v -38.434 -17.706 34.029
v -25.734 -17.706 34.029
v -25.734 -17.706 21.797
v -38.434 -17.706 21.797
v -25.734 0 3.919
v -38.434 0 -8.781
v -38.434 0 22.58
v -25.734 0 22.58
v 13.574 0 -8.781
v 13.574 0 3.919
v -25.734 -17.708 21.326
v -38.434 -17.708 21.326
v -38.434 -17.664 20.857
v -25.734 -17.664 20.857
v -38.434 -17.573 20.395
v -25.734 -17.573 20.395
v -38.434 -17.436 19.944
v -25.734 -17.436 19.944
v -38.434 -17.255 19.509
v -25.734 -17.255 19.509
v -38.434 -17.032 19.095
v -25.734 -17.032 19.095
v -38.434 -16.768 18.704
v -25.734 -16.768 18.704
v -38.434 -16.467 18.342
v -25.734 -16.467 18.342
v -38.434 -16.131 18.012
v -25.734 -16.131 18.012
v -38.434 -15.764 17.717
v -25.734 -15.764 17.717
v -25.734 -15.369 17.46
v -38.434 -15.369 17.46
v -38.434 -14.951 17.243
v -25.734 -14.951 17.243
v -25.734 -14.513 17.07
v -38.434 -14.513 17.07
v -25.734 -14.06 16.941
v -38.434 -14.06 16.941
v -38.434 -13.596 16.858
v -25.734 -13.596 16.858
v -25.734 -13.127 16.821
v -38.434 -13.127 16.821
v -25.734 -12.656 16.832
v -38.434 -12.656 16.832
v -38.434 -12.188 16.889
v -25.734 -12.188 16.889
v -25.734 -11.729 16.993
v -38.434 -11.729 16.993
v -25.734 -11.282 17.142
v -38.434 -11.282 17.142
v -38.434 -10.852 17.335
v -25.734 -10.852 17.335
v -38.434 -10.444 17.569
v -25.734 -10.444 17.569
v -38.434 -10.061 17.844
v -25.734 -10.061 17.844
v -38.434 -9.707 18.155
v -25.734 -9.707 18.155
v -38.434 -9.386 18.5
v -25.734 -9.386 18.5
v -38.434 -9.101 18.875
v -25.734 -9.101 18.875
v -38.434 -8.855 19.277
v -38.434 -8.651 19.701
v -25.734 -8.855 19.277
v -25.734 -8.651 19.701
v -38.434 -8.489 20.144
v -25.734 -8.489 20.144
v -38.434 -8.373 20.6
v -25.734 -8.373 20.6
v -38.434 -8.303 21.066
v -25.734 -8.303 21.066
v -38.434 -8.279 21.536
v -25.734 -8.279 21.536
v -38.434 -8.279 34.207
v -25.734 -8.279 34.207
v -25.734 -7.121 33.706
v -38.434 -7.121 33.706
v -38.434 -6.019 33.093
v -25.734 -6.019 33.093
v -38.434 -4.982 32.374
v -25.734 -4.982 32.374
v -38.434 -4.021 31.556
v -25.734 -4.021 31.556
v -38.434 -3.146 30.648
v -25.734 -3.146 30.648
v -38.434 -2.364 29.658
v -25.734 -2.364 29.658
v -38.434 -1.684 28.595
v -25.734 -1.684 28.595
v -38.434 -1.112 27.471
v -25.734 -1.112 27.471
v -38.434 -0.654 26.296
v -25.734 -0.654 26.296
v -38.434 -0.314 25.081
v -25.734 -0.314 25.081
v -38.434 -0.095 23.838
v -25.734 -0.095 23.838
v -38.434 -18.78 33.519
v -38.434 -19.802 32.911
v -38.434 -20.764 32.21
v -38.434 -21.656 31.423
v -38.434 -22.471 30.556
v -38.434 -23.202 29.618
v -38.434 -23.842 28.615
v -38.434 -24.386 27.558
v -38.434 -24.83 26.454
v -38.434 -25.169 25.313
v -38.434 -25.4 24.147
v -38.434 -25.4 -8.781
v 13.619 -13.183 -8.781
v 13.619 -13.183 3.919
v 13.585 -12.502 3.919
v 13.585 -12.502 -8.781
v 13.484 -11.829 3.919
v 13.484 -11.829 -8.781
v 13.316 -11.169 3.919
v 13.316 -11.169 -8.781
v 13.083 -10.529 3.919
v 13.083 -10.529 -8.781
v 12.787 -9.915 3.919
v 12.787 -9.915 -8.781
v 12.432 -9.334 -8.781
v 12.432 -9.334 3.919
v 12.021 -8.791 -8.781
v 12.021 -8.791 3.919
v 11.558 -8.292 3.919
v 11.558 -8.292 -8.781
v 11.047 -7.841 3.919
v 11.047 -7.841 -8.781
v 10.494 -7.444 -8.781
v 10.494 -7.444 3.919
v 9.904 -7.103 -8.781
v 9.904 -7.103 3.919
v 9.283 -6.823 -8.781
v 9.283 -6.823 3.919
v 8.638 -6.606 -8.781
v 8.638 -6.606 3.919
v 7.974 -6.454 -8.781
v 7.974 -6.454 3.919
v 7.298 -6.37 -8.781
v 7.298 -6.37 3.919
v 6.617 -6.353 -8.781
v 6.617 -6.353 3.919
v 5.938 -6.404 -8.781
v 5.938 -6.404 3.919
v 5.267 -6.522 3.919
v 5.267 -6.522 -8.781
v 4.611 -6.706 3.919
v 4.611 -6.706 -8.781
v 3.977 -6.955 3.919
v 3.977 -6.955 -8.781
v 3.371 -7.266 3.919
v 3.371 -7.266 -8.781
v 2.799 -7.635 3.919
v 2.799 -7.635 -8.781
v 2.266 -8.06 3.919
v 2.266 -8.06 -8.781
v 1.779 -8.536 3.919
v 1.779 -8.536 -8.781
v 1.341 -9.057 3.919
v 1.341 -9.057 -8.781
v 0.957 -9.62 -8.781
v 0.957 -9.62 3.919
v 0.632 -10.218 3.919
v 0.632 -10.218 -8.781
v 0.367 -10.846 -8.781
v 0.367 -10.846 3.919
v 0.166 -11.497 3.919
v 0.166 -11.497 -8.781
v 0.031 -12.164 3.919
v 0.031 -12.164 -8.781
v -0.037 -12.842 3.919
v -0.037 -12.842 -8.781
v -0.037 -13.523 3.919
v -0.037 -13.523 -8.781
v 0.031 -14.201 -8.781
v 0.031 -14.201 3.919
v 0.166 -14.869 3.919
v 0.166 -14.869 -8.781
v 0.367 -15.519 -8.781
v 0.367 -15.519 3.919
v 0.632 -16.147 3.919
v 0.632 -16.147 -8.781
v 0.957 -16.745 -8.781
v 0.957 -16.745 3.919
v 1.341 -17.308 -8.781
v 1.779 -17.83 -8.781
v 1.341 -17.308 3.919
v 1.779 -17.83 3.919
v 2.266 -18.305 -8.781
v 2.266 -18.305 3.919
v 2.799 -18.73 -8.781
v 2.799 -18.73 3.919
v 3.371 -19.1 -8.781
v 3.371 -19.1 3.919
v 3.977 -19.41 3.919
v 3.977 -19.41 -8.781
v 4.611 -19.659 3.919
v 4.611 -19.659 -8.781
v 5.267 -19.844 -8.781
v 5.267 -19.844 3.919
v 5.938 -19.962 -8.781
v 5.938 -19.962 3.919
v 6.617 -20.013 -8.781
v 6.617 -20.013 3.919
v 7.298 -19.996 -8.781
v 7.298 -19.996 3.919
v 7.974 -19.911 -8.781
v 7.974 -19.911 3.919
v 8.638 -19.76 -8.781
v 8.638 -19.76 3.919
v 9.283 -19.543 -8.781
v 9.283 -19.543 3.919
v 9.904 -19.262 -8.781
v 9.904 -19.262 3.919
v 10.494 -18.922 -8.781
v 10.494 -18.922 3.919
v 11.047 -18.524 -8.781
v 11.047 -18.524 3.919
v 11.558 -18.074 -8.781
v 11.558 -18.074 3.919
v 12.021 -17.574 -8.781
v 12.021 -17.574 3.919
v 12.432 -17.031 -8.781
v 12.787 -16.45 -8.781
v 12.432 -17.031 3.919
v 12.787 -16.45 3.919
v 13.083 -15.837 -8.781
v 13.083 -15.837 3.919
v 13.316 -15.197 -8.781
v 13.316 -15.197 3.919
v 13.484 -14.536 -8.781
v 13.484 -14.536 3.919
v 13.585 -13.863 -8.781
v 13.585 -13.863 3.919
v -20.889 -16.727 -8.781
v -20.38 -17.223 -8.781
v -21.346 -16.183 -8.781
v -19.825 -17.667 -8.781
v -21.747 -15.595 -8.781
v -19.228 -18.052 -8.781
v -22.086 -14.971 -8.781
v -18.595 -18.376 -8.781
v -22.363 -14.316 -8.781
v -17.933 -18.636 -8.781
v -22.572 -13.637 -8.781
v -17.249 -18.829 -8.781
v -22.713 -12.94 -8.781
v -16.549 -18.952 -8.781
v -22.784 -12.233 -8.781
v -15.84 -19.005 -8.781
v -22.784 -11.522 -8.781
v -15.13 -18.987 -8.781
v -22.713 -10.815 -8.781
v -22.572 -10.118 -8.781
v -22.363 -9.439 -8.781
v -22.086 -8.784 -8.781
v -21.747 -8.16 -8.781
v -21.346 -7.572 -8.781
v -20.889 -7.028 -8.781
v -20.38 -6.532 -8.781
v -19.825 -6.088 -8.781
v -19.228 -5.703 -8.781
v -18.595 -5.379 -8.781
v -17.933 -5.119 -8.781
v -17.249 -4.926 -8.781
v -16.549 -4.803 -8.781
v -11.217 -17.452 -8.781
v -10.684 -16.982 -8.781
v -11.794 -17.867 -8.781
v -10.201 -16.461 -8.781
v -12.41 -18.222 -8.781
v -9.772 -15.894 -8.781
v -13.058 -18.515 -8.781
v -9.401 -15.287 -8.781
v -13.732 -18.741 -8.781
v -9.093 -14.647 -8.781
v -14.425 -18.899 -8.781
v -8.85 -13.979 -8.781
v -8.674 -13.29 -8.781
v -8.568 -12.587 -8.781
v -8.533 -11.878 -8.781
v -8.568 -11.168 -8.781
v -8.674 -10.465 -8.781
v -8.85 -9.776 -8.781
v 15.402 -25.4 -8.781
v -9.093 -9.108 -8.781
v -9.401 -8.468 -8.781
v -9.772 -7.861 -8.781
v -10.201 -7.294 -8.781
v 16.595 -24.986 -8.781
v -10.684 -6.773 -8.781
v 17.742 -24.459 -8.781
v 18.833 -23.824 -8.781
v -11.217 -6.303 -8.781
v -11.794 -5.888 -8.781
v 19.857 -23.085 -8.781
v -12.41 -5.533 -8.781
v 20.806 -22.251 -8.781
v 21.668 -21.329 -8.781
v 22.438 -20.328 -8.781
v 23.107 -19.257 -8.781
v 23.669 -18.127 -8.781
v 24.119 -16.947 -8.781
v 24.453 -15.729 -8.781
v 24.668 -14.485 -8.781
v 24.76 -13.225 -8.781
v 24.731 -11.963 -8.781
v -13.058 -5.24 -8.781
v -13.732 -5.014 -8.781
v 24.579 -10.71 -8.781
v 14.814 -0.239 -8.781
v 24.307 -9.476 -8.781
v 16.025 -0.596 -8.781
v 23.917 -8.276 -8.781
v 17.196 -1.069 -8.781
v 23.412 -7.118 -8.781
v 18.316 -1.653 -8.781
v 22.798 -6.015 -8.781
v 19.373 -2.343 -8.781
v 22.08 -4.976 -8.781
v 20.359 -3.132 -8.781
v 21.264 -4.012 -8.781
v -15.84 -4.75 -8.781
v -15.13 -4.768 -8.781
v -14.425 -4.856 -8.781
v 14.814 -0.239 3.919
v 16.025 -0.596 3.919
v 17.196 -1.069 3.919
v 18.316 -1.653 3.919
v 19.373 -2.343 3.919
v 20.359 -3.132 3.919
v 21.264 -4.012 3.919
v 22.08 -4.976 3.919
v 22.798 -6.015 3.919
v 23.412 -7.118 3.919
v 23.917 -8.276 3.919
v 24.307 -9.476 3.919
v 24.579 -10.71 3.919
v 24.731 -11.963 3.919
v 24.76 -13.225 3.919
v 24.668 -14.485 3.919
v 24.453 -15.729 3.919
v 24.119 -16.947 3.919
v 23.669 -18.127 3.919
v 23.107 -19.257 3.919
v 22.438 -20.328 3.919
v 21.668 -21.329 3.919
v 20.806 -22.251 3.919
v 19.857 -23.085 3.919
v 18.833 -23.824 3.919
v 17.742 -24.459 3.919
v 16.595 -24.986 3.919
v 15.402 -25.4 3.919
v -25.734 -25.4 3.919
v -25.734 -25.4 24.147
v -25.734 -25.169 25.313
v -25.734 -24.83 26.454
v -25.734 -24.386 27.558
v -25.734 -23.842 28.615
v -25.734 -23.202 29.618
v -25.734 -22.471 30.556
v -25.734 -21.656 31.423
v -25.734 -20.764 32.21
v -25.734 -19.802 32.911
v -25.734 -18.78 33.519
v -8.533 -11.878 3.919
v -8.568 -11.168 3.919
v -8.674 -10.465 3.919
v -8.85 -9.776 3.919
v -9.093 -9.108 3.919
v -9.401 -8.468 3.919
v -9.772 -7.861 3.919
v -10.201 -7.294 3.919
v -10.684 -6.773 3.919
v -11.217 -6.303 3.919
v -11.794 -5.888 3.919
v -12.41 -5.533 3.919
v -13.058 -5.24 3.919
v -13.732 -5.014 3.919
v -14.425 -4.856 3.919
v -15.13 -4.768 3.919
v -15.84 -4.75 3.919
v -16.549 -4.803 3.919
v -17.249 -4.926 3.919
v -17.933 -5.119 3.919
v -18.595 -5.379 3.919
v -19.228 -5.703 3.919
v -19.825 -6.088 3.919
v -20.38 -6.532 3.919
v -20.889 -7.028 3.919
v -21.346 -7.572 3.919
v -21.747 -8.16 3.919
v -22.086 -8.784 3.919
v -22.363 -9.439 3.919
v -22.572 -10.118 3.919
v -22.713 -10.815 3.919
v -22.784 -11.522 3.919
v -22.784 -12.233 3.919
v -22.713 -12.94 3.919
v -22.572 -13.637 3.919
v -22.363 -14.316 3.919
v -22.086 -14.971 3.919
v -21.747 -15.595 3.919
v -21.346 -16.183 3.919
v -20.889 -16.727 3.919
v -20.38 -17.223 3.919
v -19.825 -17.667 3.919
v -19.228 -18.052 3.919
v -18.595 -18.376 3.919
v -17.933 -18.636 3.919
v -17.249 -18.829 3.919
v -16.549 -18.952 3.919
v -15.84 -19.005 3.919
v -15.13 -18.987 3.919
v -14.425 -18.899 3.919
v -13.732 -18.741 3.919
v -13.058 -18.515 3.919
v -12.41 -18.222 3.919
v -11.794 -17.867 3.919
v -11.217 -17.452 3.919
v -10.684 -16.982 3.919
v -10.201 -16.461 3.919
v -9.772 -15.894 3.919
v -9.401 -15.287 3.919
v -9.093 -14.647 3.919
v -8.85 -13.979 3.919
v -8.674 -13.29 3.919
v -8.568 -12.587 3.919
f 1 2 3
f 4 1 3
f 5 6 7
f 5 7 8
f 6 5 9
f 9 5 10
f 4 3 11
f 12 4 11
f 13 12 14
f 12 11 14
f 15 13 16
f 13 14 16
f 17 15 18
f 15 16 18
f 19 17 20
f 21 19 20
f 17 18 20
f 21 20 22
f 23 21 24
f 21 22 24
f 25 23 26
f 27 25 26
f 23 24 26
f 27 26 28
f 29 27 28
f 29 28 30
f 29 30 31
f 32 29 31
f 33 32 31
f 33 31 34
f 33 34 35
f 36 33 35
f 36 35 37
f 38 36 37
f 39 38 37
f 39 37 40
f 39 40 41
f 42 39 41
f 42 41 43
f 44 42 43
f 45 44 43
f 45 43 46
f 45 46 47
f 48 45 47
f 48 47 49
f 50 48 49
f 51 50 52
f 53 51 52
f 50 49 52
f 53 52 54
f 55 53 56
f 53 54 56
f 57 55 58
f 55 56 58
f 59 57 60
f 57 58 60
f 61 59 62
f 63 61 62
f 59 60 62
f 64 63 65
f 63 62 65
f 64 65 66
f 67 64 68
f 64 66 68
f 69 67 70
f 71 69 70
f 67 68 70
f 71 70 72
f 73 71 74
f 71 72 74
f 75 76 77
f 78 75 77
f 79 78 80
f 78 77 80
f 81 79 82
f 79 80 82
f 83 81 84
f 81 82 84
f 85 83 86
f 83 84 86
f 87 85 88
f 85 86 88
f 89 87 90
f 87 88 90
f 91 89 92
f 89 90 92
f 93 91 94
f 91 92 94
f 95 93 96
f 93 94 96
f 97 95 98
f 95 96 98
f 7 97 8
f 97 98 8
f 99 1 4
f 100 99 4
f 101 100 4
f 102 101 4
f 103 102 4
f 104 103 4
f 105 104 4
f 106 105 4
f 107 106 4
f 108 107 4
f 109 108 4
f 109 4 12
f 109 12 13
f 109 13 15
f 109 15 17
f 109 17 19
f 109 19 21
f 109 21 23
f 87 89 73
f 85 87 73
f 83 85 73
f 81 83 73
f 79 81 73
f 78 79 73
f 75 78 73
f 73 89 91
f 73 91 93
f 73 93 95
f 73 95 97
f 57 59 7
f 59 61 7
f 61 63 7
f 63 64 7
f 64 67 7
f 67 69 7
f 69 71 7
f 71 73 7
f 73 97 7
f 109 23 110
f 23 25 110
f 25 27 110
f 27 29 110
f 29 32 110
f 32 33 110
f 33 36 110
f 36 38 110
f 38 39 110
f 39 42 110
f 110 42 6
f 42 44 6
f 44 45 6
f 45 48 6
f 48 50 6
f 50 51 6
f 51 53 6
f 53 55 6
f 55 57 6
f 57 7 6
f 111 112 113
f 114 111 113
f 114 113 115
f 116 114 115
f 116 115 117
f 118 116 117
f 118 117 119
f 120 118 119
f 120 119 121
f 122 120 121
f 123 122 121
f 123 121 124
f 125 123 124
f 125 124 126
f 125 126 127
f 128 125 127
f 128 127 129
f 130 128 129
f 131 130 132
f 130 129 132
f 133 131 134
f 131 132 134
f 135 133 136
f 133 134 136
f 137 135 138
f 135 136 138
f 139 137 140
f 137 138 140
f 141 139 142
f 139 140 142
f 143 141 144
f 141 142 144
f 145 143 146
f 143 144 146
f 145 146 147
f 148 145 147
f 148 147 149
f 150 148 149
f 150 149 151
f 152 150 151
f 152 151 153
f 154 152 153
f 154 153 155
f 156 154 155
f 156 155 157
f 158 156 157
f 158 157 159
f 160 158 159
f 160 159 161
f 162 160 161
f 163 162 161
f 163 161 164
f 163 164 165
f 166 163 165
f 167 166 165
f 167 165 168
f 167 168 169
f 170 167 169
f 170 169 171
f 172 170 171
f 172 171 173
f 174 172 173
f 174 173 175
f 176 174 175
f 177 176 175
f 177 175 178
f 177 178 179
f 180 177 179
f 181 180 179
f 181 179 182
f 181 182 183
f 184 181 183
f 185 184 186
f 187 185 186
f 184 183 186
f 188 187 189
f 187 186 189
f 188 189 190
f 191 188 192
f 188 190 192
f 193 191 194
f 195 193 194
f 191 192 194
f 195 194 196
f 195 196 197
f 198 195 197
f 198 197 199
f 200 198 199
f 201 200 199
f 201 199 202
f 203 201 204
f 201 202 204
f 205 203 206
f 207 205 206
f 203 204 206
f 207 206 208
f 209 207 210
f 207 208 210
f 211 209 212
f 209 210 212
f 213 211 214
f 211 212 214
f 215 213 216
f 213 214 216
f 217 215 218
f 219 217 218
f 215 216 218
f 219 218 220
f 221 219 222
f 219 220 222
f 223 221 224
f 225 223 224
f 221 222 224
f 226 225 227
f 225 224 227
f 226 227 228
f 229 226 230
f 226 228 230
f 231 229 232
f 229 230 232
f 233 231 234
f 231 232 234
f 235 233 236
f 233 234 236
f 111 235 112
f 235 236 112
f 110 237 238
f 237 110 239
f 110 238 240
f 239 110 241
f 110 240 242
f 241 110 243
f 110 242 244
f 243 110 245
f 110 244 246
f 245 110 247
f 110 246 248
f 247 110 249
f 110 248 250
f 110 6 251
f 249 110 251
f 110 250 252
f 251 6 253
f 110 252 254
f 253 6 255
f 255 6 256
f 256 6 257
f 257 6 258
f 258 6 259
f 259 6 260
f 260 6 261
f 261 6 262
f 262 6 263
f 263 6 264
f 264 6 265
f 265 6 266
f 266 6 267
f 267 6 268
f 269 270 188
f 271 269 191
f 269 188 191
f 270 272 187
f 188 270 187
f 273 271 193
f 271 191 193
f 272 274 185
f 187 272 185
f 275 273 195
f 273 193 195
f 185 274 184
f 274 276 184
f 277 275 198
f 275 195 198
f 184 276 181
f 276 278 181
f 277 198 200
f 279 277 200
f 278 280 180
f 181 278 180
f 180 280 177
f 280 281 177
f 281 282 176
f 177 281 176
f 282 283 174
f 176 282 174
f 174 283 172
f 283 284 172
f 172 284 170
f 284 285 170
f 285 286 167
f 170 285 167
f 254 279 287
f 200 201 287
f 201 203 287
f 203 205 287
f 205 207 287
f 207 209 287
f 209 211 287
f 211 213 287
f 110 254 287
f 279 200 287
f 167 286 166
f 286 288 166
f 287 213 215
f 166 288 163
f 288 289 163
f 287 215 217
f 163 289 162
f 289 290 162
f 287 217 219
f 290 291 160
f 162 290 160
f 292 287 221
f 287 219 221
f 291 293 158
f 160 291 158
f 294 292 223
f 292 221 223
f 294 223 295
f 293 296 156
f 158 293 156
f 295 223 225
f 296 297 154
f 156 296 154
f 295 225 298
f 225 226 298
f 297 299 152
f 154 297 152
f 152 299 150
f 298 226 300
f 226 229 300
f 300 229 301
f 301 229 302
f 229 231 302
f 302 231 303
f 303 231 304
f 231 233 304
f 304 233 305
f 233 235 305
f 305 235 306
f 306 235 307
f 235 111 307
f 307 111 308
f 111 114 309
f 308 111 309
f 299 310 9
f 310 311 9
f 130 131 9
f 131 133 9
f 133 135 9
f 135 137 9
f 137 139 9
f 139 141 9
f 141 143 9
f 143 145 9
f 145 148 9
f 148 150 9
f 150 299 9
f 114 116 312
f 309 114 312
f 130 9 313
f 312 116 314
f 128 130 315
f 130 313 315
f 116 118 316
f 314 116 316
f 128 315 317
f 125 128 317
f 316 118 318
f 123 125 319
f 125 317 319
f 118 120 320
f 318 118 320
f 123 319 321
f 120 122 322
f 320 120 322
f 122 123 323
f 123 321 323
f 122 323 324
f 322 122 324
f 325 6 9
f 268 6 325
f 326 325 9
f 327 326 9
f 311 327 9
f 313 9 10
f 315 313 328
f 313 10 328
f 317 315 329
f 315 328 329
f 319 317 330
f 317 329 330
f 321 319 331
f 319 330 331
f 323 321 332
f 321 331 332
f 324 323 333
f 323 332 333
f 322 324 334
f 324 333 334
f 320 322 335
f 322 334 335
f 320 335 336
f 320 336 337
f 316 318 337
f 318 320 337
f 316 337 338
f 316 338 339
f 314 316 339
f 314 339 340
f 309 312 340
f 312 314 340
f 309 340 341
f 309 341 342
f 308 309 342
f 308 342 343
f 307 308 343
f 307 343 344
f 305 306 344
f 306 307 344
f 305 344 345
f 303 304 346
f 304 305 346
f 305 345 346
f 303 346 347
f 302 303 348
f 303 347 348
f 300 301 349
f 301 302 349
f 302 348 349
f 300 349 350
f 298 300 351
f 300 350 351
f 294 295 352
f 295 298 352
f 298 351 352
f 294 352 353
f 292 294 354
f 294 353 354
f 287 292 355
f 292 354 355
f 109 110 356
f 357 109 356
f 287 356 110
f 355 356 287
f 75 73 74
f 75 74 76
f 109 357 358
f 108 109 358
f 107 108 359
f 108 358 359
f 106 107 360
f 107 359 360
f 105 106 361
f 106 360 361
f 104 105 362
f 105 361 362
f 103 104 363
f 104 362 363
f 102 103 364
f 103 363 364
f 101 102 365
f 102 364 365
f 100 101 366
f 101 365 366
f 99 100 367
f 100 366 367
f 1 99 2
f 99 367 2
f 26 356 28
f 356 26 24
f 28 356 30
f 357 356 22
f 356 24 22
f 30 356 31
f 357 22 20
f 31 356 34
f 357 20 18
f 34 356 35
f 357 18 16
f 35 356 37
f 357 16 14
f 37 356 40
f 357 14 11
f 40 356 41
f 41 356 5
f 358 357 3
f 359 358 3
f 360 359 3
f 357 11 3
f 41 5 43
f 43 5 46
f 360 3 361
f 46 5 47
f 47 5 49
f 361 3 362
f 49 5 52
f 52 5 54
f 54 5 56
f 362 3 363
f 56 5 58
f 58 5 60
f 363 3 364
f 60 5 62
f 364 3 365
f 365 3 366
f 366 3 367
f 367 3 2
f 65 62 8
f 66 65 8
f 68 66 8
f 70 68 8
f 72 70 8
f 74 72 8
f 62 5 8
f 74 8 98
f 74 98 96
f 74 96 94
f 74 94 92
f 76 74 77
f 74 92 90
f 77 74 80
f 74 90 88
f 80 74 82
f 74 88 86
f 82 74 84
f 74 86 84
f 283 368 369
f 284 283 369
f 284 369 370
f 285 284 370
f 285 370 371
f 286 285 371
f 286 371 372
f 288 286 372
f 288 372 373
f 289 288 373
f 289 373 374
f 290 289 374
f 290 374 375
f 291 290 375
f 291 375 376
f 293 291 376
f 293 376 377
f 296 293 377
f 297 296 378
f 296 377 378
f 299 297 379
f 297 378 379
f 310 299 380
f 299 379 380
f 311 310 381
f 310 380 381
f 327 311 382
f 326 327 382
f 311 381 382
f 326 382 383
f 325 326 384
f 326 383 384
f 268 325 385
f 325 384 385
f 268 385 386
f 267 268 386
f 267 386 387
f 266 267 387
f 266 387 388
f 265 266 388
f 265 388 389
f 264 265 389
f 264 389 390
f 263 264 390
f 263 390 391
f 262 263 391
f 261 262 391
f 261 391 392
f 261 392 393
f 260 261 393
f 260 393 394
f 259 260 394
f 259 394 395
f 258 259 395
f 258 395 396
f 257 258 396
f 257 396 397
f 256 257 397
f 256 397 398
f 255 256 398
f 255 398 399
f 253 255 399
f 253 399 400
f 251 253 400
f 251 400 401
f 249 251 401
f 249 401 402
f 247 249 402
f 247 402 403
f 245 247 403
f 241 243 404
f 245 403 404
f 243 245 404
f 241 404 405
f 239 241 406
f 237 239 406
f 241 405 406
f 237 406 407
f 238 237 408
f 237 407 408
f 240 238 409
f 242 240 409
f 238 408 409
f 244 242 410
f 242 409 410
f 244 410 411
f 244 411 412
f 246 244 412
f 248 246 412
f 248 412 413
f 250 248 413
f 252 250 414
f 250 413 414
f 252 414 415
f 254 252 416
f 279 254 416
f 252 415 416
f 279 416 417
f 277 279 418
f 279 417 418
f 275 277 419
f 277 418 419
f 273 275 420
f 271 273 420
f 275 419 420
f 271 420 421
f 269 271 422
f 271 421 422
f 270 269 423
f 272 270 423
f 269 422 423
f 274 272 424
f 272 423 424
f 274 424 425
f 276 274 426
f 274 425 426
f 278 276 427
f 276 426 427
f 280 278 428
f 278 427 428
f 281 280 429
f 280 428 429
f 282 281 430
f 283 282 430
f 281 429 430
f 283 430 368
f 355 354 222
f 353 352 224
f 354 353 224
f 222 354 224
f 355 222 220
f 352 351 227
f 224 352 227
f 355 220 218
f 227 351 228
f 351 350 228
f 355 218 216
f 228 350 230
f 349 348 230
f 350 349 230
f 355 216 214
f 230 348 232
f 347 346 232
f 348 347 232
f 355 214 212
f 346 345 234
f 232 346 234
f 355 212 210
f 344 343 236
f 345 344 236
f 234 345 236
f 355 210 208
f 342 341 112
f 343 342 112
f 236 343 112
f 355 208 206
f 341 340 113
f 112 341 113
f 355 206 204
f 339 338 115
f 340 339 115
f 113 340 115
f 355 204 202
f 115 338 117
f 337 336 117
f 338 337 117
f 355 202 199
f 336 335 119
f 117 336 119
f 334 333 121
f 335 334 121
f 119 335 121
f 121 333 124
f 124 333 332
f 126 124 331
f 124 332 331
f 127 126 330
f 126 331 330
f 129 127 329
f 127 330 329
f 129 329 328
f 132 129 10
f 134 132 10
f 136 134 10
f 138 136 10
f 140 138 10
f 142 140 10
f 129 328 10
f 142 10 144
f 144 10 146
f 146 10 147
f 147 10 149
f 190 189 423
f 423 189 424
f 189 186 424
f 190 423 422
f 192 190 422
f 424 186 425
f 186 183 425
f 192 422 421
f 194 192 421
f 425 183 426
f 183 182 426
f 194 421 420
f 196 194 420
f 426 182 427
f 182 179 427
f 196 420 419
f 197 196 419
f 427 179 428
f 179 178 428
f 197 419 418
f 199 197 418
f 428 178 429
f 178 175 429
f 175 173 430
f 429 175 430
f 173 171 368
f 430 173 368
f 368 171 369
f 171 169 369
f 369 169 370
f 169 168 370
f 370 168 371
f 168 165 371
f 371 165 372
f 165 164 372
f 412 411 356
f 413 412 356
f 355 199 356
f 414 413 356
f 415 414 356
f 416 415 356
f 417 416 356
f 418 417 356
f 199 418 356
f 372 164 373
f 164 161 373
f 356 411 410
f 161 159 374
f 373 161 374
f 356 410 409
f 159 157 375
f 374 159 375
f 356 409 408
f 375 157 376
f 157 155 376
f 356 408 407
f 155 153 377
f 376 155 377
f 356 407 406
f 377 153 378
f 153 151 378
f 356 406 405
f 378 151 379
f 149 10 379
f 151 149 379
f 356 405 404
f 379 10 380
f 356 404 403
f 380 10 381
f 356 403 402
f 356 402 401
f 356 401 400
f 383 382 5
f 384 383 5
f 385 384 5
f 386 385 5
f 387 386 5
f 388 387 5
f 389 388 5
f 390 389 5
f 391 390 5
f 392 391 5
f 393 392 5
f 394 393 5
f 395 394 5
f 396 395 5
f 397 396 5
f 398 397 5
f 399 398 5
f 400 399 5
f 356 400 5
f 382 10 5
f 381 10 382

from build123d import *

# Parameters (mm, degrees)
F1_DEPTH = 25.4
F3_DEPTH = 25.4
F5_DEPTH = 25.4
F6_R     = 7.129897
F6_R_2   = 6.832178
F7_DEPTH = 25.4


with BuildPart() as f1:
    # F0 (on Front) → F1 (new body)
    with BuildSketch(Plane.XZ):
        Polygon((-25.733615, 35.668769), (-38.433615, 35.668769), (-38.433615, -8.781231), (25.066385, -8.781231), (25.066385, 3.918769), (-25.733615, 3.918769), align=None)
    extrude(amount=F1_DEPTH)

    # F2 (on face) → F3 (cut)
    with BuildSketch(Plane.YZ.offset(-25.733615)):
        with BuildLine():
            ThreePointArc((-25.4, 24.146574), (-11.982597, 34.99752), (0, 22.580311))
            Line((0, 22.580311), (0, 35.668769))
            Line((0, 35.668769), (-25.4, 35.668769))
            Line((-25.4, 35.668769), (-25.4, 24.146574))
        make_face()
    extrude(amount=-F3_DEPTH, mode=Mode.SUBTRACT)

    # F4 (on face) → F5 (cut)
    with BuildSketch(Plane.YZ.offset(-25.733615)):
        with BuildLine():
            ThreePointArc((-8.279151, 34.206712), (-13.009328, 35.01947), (-17.705537, 34.029128))
            Line((-17.705537, 34.029128), (-17.705537, 21.797176))
            ThreePointArc((-17.705537, 21.797176), (-13.126532, 16.82113), (-8.279151, 21.53613))
            Line((-8.279151, 21.53613), (-8.279151, 34.206712))
        make_face()
    extrude(amount=-F5_DEPTH, mode=Mode.SUBTRACT)

    # F6 (on face) → F7 (cut)
    with BuildSketch(Plane.XY.offset(3.918769)):
        with Locations((-15.662644, -11.877504)):
            Circle(F6_R)
        with Locations((6.787145, -13.182725)):
            Circle(F6_R_2)
        with BuildLine():
            ThreePointArc((13.574292, 0), (24.730975, -11.963104), (15.401599, -25.4))
            Line((15.401599, -25.4), (25.066385, -25.4))
            Line((25.066385, -25.4), (25.066385, 0))
            Line((25.066385, 0), (13.574292, 0))
        make_face()
    extrude(amount=-F7_DEPTH, mode=Mode.SUBTRACT)


solid = f1.part
